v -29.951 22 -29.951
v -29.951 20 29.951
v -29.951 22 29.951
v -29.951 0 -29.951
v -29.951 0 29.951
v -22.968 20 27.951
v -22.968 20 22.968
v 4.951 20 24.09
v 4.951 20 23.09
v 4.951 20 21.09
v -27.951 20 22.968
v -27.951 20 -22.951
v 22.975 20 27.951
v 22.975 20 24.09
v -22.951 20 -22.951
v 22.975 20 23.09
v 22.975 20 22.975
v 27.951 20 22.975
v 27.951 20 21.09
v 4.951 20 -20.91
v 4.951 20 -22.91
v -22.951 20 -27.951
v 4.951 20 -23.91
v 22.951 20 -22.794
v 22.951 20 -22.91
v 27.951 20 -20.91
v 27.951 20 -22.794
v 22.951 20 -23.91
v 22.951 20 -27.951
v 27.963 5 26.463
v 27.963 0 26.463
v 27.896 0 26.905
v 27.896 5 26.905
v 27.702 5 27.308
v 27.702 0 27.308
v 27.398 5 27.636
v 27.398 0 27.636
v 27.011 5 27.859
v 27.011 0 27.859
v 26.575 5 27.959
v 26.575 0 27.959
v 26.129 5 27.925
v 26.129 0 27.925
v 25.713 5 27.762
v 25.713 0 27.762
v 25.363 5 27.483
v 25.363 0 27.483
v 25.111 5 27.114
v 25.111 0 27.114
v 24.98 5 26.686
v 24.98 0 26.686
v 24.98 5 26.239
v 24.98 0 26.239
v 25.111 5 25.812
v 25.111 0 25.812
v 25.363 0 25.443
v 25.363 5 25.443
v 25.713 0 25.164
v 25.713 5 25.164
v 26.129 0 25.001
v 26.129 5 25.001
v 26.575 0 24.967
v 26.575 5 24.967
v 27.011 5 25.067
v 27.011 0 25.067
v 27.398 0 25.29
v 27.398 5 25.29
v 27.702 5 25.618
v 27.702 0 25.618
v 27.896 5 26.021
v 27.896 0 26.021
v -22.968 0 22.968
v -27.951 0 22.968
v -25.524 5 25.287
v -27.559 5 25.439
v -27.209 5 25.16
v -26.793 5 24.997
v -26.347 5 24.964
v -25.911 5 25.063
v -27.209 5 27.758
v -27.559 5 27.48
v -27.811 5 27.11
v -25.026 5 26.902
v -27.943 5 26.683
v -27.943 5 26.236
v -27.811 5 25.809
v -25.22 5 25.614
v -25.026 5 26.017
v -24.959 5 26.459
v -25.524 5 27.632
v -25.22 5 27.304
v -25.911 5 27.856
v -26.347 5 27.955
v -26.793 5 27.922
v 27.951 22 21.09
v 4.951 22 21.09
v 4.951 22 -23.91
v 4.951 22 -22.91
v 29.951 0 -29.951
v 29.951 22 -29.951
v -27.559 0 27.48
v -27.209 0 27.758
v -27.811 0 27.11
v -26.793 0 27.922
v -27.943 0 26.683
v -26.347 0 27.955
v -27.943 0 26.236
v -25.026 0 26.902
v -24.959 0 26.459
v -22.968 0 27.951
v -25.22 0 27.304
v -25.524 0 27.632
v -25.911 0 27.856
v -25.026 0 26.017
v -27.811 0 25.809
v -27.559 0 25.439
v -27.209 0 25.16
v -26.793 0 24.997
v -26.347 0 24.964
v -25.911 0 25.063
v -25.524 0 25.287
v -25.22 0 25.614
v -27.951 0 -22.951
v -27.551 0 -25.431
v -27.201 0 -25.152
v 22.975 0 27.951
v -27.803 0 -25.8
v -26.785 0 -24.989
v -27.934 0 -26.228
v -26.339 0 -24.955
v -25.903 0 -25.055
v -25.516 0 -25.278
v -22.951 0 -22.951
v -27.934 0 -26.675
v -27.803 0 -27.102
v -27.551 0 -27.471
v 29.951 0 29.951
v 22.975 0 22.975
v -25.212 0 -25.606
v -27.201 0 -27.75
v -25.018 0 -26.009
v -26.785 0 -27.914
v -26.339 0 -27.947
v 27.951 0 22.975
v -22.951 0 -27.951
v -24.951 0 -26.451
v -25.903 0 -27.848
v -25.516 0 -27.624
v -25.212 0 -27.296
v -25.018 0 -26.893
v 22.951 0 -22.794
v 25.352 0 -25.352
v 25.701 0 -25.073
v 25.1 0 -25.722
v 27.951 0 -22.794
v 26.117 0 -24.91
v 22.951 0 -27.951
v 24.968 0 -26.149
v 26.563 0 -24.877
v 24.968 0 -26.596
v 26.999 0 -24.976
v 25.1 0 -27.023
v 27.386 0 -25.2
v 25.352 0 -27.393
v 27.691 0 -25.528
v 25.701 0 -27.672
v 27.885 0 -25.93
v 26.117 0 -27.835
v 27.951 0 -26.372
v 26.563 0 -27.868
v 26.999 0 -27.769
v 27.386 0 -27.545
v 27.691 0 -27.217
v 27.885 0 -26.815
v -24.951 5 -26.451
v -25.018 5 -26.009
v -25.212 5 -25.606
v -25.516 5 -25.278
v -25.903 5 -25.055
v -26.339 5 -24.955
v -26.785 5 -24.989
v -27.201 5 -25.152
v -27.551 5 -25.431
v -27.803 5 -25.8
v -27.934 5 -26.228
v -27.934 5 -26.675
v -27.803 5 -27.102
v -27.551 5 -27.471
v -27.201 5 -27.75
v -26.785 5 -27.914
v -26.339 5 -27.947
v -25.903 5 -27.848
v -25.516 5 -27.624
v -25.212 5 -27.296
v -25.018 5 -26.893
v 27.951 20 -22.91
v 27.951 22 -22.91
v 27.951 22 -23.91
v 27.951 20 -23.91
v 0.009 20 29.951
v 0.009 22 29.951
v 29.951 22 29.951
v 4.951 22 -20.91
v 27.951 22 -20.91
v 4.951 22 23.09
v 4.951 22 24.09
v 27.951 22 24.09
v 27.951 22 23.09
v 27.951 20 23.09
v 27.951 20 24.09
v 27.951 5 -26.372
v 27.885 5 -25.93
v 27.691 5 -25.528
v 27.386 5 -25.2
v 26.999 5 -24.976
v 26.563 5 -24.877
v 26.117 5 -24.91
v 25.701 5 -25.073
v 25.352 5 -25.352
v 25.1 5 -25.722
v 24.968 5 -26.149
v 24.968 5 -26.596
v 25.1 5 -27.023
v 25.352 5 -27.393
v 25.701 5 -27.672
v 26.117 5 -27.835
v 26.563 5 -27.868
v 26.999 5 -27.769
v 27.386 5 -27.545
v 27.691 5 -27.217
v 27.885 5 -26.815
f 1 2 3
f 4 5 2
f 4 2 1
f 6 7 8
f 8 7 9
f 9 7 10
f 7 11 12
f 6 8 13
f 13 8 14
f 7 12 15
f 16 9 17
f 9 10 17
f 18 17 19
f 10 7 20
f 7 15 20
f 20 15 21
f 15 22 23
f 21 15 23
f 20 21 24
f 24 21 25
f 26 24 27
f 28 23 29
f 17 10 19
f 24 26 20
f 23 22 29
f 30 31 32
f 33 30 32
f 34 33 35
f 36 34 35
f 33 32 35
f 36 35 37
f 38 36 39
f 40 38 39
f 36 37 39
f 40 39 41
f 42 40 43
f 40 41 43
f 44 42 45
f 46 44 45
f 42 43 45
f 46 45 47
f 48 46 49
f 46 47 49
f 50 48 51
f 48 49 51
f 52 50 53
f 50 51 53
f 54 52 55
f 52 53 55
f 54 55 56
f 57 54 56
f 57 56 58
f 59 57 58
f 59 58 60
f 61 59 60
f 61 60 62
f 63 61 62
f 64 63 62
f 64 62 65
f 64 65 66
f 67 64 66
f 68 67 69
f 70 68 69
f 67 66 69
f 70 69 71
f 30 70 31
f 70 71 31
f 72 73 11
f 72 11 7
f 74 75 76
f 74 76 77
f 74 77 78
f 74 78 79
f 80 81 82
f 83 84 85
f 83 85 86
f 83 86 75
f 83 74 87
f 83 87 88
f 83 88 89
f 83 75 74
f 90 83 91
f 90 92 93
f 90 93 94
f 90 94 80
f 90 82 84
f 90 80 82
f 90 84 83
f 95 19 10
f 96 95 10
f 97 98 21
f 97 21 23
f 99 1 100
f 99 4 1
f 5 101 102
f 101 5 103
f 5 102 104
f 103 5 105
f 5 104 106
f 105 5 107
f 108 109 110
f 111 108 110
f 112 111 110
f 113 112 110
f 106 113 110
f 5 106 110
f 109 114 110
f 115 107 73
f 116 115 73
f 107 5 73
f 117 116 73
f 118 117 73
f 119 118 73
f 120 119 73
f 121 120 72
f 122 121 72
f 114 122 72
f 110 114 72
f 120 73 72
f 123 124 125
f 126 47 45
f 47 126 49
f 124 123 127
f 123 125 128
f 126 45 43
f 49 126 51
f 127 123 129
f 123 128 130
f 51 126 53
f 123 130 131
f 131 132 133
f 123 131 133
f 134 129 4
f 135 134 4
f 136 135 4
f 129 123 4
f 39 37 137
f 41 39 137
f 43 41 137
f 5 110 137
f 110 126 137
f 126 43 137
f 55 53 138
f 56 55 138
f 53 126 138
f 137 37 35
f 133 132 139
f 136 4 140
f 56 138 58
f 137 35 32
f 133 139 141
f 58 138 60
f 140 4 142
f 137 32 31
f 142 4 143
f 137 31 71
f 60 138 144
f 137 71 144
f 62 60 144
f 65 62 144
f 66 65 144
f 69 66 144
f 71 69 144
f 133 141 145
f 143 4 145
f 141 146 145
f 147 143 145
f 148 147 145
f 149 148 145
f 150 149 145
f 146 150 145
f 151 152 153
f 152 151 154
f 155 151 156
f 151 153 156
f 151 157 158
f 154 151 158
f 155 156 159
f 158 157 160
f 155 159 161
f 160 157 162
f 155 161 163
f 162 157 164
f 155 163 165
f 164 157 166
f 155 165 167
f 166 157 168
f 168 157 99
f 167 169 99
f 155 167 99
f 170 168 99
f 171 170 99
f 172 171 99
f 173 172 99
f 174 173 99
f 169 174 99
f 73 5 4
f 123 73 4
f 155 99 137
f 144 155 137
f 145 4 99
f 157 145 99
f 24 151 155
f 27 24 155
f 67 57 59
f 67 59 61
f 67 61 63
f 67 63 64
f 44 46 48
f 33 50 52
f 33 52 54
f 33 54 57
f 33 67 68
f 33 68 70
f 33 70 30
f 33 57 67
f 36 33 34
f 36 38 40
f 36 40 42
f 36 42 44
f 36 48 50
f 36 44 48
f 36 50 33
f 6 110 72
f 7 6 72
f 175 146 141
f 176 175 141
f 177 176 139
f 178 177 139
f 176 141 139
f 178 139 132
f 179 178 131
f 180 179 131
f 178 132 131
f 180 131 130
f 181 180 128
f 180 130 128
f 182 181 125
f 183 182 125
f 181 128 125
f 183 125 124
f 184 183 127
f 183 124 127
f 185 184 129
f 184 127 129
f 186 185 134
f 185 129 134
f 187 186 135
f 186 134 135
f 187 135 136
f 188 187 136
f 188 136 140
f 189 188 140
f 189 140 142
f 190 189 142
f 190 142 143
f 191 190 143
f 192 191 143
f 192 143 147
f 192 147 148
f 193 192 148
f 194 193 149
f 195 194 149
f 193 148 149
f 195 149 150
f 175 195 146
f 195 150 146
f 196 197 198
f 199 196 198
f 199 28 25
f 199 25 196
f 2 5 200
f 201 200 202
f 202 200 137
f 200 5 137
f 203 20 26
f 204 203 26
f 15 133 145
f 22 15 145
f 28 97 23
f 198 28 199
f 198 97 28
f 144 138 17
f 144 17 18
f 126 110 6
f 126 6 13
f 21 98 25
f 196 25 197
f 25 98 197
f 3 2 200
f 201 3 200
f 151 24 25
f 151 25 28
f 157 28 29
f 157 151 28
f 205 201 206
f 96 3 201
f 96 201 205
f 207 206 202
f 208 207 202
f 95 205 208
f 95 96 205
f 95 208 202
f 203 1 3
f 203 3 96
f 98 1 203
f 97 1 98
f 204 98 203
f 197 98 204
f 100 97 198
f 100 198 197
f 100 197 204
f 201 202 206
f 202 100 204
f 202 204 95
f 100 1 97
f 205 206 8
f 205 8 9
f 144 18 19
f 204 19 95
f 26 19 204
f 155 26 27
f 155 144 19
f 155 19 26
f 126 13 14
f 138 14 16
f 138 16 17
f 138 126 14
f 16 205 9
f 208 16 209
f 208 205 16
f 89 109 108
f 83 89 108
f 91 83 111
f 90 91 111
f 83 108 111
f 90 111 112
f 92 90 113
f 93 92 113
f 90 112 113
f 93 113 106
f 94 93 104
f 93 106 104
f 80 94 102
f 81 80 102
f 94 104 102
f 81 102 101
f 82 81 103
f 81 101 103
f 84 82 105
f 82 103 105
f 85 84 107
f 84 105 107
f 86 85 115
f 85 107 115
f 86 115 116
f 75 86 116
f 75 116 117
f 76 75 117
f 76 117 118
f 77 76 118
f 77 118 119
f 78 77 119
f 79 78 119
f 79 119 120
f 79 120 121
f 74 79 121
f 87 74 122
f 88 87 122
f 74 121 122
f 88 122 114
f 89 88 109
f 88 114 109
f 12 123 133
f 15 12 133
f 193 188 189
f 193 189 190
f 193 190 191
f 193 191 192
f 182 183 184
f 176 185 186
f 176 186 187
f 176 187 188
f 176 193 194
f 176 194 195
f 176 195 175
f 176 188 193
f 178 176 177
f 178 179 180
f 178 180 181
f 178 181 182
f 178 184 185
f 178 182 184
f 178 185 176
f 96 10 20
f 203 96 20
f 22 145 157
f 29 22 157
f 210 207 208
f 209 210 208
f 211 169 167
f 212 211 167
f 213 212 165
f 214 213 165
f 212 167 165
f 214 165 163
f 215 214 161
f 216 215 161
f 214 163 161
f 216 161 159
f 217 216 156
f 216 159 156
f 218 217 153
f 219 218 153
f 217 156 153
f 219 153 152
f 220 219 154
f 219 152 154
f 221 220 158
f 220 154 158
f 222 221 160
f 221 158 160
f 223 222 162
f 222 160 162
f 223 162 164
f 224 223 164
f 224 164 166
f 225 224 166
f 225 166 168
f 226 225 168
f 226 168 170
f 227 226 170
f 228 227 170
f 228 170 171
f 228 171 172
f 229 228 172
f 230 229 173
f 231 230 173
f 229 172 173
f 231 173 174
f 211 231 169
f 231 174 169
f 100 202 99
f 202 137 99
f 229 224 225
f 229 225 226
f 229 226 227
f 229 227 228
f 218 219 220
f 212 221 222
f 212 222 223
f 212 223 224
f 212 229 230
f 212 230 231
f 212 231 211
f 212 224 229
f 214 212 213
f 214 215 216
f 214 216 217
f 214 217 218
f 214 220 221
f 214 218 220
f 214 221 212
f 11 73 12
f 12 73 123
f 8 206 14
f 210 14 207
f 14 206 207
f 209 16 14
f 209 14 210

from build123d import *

# Parameters (mm, degrees)
SKETCH1_W            = 59.902393064
SKETCH1_H            = 59.902393064
SKETCH1_W_2          = 55.902393064
SKETCH1_H_2          = 55.902393064
SKETCH1_W_3          = 5
SKETCH1_H_3          = 5
SKETCH1_H_4          = 5.157397932
SKETCH1_W_4          = 4.976574335
SKETCH1_H_5          = 4.976574335
SKETCH1_W_5          = 4.983582997
SKETCH1_H_6          = 4.983582997
BOSS_EXTRUDE1_DEPTH  = 20
BOSS_EXTRUDE2_DEPTH  = 2
SKETCH3_W            = 23
SKETCH3_H            = 1
CUT_EXTRUDE1_DEPTH   = 2
SKETCH4_W            = 29.96
SKETCH4_H            = 59.9024
BOSS_EXTRUDE28_DEPTH = 2
SKETCH5_R            = 1.5
CUT_EXTRUDE2_DEPTH   = 5


with BuildPart() as part:
    # Sketch1 → Boss-Extrude1 (new body)
    with BuildSketch(Plane(origin=(0, 0, 0), x_dir=(1, 0, 0), z_dir=(0, 1, 0))):
        Rectangle(SKETCH1_W, SKETCH1_H)
        Rectangle(SKETCH1_W_2, SKETCH1_H_2, mode=Mode.SUBTRACT)
        with Locations((-25.451196532, 25.451196532)):
            Rectangle(SKETCH1_W_3, SKETCH1_H_3)
        with Locations((25.451196532, 25.372497566)):
            Rectangle(SKETCH1_W_3, SKETCH1_H_4)
        with Locations((25.462909364, -25.462909364)):
            Rectangle(SKETCH1_W_4, SKETCH1_H_5)
        with Locations((-25.459405034, -25.459405034)):
            Rectangle(SKETCH1_W_5, SKETCH1_H_6)
    extrude(amount=BOSS_EXTRUDE1_DEPTH)

    # Sketch2 → Boss-Extrude2 (add)
    with BuildSketch(Plane(origin=(0, 20, 0), x_dir=(1, 0, 0), z_dir=(0, 1, 0))):
        Polygon((4.951196532, -21.090411798), (4.951196532, -0.090411798), (4.951196532, 20.909588202), (4.951196532, 27.951196532), (0, 27.951196532), (0.003504331, -27.951196532), (4.951196532, -27.951196532), align=None)
        Polygon((29.951196532, -21.090411798), (27.951196532, -21.090411798), (27.951196532, -22.974622197), (22.974622197, -22.974622197), (22.974622197, -27.951196532), (4.951196532, -27.951196532), (0.003504331, -27.951196532), (0, -29.951196532), (29.951196532, -29.951196532), align=None)
        Polygon((27.951196532, -22.974622197), (27.951196532, -21.090411798), (4.951196532, -21.090411798), (4.951196532, -27.951196532), (22.974622197, -27.951196532), (22.974622197, -22.974622197), align=None)
        Polygon((27.951196532, 20.909588202), (27.951196532, -0.090411798), (27.951196532, -21.090411798), (29.951196532, -21.090411798), (29.951196532, 20.909588202), align=None)
        Polygon((27.951196532, 22.7937986), (27.951196532, 20.909588202), (29.951196532, 20.909588202), (29.951196532, 29.951196532), (0, 29.951196532), (0, 27.951196532), (4.951196532, 27.951196532), (22.951196532, 27.951196532), (22.951196532, 22.7937986), align=None)
        Polygon((4.951196532, 20.909588202), (27.951196532, 20.909588202), (27.951196532, 22.7937986), (22.951196532, 22.7937986), (22.951196532, 27.951196532), (4.951196532, 27.951196532), align=None)
    extrude(amount=BOSS_EXTRUDE2_DEPTH)

    # Sketch3 → Cut-Extrude1 (cut)
    with BuildSketch(Plane(origin=(0, 22, 0), x_dir=(1, 0, 0), z_dir=(0, 1, 0))):
        with Locations((16.451196532, -23.590411798)):
            Rectangle(SKETCH3_W, SKETCH3_H)
        with Locations((16.451196532, 23.409588202)):
            Rectangle(SKETCH3_W, SKETCH3_H)
    extrude(amount=-CUT_EXTRUDE1_DEPTH, mode=Mode.SUBTRACT)

    # Sketch4 → Boss-Extrude28 (add)
    with BuildSketch(Plane(origin=(0, 20, 0), x_dir=(1, 0, 0), z_dir=(0, 1, 0))):
        with Locations((-14.971196532, -3.468e-06)):
            Rectangle(SKETCH4_W, SKETCH4_H)
    extrude(amount=BOSS_EXTRUDE28_DEPTH)

    # Sketch5 → Cut-Extrude2 (cut)
    with BuildSketch(Plane.XZ):
        with Locations((-26.459405034, 26.459405034)):
            Circle(SKETCH5_R)
        with Locations((26.462909365, 26.462909365)):
            Circle(SKETCH5_R)
        with Locations((26.451196532, -26.372497566)):
            Circle(SKETCH5_R)
        with Locations((-26.451196532, -26.451196532)):
            Circle(SKETCH5_R)
    extrude(amount=-CUT_EXTRUDE2_DEPTH, mode=Mode.SUBTRACT)


solid = part.part
